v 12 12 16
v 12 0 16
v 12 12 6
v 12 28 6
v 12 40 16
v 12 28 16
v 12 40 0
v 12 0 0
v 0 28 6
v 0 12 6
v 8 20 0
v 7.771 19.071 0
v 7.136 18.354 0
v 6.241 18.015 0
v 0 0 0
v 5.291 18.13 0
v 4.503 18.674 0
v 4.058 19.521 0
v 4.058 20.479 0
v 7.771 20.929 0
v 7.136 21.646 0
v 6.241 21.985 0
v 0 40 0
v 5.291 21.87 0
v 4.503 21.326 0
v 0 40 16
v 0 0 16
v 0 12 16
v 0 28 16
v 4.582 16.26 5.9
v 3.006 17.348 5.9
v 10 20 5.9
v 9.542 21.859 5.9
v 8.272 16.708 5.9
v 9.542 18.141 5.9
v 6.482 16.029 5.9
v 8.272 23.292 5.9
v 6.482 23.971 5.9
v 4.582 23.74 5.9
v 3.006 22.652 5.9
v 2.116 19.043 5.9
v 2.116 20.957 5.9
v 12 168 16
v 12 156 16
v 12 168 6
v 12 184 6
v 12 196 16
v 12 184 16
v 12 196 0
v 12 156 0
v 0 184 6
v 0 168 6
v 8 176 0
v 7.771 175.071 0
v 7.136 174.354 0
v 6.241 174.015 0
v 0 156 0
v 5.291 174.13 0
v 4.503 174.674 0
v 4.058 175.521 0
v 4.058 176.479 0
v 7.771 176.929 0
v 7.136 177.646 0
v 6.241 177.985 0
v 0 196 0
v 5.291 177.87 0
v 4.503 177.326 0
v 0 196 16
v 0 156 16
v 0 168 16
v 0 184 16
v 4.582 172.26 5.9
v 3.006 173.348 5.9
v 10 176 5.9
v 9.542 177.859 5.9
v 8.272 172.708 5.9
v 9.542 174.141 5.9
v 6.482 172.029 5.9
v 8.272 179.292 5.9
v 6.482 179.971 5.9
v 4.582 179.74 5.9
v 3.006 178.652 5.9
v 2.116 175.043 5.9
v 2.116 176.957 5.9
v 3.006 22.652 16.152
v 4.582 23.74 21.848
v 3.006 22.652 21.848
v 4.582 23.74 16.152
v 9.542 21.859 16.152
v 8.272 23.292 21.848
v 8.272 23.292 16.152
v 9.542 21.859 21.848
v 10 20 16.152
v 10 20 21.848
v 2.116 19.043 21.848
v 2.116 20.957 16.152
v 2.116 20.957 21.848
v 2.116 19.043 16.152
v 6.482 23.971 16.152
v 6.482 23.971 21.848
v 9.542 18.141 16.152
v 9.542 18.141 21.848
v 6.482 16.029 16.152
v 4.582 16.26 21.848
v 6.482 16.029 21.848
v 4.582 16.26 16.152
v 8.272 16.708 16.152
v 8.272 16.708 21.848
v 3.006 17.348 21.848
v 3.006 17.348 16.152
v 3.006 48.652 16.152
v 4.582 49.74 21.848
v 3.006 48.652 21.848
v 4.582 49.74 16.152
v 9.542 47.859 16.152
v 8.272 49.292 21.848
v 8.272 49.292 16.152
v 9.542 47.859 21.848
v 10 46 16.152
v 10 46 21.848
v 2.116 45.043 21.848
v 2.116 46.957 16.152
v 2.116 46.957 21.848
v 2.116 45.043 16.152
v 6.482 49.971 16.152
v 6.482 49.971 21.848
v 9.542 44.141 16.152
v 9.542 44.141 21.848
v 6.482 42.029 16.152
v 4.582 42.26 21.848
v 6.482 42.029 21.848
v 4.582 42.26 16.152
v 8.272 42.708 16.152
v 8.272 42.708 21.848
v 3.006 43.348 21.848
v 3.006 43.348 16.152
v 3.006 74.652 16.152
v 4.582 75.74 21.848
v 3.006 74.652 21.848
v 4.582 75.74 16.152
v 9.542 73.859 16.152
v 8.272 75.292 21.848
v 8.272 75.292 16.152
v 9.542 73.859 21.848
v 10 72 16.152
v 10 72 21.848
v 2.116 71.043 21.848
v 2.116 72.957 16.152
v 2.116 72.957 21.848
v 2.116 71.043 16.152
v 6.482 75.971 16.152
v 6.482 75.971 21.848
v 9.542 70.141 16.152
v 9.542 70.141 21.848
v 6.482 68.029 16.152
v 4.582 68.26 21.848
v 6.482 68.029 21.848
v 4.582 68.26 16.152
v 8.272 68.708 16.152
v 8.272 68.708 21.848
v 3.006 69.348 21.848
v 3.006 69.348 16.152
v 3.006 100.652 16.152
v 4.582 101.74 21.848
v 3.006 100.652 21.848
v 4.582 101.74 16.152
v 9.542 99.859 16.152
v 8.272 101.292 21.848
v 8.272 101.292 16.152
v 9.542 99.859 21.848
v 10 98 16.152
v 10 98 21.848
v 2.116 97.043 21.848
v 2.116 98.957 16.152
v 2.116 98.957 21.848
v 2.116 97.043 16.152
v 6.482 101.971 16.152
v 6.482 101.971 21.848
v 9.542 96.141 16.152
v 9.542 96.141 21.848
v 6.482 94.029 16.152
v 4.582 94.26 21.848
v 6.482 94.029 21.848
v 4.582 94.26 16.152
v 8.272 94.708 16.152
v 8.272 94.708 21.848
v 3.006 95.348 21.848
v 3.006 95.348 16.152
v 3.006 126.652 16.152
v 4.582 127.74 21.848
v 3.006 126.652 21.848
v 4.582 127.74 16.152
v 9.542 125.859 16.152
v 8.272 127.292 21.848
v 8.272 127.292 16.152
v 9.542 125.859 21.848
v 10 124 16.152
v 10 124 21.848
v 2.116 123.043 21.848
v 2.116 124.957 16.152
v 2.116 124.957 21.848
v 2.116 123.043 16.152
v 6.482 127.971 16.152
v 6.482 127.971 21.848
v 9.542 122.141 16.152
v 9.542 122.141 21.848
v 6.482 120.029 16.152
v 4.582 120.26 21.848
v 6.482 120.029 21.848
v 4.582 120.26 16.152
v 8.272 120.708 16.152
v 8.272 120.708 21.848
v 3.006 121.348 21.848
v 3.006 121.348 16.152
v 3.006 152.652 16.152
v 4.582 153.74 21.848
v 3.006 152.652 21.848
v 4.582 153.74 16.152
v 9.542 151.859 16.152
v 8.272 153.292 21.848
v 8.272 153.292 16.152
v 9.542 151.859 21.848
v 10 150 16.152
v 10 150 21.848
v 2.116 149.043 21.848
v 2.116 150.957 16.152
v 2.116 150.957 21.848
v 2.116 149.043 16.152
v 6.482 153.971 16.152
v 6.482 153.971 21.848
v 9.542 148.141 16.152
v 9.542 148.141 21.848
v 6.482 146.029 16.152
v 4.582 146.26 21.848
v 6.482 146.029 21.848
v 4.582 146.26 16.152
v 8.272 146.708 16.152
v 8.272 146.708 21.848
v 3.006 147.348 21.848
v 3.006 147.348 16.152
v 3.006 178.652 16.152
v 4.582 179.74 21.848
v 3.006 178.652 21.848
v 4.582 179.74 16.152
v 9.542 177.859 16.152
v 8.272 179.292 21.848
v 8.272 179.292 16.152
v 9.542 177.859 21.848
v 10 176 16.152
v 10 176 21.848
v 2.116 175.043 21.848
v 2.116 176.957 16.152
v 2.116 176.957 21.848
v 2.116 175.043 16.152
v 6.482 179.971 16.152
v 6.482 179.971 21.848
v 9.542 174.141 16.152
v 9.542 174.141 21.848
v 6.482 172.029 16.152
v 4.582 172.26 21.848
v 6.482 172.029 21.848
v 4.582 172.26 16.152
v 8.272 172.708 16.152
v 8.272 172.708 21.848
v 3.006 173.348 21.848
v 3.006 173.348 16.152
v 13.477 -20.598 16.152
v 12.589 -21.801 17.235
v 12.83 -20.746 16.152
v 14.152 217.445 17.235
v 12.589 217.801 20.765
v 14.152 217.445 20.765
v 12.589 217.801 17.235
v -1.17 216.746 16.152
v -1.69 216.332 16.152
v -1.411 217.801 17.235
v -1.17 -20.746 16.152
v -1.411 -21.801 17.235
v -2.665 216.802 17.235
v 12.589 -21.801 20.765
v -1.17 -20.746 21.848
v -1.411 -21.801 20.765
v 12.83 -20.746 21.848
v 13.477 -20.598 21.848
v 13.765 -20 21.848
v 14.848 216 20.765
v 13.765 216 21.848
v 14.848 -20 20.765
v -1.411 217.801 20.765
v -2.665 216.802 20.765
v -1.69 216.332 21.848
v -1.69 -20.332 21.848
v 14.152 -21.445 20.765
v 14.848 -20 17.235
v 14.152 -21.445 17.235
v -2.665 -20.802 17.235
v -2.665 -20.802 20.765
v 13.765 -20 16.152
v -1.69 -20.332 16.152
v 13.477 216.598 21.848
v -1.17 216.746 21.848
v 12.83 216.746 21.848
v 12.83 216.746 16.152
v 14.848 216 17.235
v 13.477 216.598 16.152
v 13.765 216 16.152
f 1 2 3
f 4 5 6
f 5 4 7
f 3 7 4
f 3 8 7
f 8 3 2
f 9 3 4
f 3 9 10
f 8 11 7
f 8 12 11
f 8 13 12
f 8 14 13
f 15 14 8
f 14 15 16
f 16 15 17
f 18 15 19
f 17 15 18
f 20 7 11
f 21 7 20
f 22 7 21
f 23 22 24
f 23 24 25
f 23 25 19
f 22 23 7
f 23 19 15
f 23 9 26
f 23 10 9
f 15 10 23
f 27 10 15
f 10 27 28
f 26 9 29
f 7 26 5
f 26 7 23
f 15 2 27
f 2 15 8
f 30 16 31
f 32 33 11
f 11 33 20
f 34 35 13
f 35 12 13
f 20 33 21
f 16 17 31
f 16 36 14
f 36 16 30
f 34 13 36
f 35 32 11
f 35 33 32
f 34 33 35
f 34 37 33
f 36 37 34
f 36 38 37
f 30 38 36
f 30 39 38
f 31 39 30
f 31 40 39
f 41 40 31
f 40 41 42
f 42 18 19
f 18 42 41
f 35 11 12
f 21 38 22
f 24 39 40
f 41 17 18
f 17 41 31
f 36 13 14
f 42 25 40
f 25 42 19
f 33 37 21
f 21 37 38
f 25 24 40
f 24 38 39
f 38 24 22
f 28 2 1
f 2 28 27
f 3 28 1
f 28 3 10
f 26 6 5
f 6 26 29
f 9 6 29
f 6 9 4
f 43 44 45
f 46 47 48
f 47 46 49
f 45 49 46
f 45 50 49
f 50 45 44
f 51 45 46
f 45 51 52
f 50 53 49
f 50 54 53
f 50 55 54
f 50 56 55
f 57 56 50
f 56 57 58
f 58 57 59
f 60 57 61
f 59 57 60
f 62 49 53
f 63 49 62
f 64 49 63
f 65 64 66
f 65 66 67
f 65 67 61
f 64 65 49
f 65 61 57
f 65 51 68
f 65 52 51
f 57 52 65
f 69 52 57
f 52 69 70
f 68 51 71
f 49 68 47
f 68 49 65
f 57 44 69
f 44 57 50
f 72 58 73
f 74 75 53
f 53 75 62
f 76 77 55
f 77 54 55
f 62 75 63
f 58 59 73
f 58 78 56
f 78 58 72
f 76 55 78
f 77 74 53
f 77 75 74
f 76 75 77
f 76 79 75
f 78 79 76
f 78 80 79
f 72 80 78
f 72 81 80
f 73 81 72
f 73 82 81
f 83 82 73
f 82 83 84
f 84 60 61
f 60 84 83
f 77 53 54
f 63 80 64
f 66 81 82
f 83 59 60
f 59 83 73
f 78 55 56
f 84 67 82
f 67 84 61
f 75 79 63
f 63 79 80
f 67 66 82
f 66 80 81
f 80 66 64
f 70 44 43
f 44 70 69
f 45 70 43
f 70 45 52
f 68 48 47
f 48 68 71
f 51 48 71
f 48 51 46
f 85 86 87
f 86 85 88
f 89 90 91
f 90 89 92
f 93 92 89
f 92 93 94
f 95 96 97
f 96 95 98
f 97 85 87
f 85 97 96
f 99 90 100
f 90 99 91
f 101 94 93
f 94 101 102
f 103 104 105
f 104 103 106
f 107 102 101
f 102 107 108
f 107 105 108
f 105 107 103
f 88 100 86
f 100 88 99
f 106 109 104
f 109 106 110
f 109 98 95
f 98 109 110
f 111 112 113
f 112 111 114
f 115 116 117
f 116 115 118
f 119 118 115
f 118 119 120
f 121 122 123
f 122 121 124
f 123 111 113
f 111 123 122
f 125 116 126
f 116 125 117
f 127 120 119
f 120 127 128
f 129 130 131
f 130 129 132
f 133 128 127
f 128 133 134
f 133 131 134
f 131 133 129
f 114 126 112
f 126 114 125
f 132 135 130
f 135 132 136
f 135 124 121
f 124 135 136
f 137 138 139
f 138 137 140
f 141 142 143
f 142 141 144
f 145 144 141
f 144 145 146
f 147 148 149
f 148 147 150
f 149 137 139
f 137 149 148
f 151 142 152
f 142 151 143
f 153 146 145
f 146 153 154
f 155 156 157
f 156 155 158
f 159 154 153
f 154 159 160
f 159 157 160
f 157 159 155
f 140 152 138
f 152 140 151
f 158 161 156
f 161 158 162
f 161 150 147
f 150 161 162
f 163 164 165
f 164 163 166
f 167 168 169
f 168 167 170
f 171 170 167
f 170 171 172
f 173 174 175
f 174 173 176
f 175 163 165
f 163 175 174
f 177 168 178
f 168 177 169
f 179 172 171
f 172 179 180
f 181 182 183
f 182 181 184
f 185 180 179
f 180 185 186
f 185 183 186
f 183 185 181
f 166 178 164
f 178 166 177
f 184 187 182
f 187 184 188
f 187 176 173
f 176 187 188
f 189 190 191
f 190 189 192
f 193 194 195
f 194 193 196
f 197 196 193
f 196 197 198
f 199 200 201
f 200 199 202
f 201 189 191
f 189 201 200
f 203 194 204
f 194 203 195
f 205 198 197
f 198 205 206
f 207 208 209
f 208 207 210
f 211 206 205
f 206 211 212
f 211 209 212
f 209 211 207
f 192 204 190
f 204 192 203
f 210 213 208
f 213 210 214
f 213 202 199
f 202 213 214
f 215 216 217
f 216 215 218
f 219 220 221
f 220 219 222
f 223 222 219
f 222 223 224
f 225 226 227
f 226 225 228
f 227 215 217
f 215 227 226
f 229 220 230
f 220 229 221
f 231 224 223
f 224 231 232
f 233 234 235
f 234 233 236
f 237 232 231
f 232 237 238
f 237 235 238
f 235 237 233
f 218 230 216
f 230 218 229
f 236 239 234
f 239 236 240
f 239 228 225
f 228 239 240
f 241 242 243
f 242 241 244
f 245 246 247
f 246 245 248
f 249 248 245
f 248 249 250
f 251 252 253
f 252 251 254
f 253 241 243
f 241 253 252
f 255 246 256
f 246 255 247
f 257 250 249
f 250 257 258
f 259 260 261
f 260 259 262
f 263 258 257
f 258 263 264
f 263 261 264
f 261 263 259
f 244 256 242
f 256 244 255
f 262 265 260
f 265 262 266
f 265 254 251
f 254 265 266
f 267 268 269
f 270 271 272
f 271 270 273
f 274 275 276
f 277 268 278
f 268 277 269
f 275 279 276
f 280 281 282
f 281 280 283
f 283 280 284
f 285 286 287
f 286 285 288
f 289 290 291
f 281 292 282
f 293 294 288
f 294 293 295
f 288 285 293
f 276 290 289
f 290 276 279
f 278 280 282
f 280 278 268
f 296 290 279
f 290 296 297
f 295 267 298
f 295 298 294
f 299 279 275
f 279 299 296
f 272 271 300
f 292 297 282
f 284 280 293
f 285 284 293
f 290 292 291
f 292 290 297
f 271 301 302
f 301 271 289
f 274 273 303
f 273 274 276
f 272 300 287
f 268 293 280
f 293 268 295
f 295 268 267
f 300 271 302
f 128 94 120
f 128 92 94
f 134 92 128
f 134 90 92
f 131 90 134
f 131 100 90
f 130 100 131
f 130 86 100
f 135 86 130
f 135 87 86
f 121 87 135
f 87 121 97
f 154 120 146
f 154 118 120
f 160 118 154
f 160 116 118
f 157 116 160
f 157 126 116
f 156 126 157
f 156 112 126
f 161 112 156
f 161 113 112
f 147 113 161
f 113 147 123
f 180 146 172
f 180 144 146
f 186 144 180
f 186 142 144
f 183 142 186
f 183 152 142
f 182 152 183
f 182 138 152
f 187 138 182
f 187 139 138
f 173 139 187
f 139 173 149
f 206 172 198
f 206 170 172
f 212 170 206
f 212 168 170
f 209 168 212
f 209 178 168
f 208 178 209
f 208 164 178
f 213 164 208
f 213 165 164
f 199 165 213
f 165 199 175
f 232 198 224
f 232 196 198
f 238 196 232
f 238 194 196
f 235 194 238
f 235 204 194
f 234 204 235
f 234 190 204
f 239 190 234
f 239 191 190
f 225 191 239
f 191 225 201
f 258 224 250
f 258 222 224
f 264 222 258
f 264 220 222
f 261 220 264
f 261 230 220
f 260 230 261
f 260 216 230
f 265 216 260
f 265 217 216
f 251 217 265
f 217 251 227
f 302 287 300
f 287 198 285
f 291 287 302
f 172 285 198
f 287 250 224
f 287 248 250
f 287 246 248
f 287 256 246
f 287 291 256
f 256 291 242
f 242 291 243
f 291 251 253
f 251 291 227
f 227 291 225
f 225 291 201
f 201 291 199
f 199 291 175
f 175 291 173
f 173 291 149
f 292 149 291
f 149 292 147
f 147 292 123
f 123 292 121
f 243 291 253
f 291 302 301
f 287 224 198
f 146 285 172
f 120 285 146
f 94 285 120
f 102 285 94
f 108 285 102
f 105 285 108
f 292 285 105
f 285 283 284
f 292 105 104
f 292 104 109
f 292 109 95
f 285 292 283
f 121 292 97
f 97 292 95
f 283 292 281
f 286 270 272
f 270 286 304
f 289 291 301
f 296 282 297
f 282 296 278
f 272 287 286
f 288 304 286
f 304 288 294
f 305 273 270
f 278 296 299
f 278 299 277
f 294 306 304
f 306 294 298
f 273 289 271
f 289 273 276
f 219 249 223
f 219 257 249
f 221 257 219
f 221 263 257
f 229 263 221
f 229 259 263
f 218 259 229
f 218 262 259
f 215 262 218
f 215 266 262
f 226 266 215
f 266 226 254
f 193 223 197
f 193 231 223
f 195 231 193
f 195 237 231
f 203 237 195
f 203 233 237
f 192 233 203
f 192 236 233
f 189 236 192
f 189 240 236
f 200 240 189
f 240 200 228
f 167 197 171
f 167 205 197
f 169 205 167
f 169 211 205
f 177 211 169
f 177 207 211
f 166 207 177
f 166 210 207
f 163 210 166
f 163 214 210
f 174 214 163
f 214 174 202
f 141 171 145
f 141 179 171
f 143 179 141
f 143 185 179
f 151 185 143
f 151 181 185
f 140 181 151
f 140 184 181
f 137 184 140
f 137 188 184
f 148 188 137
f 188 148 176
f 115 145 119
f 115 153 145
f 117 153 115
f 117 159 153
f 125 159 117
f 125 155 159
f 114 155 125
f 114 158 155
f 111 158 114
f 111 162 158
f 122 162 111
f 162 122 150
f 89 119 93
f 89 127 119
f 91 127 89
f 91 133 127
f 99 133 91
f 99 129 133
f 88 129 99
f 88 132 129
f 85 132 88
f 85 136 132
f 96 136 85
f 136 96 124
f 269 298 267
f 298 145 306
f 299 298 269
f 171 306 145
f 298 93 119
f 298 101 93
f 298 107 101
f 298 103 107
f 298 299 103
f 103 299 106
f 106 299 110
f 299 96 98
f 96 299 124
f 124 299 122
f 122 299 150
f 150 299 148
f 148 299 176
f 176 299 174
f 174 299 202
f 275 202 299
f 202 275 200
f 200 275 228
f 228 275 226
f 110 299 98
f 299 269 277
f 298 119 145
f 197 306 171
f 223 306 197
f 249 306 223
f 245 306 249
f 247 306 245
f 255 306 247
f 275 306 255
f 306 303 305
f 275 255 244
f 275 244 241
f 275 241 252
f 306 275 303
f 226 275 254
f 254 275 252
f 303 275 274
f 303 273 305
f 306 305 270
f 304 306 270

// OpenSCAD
// Written by Jordi Riera-Babures <jrierab@gmail.com>
// ManetaNevera V2.0 - Parameterisized for Customizer
//
// To the extent possible under law, the author(s) have dedicated all
// copyright and related and neighboring rights to this software to the
// public domain worldwide. This software is distributed without any
// warranty.
//
// You should have received a copy of the CC0 Public Domain
// Dedication along with this software.
// If not, see <http://creativecommons.org/publicdomain/zero/1.0/>.

// Hole_Separation (mm)
Hole_Separation = 156;      // [50:300]
// Width of the refrigerator handle (mm)
Handle_Width = 18;          // [10:30]
// Height of the refrigerator handle (mm)
Handle_Height = 22;         // [10:40]
// Overhang (extension) on handle ends (mm)
Handle_Overhang = 20;       // [0:50]
// Height of the top/base horizontal bars (mm)
Bar_Height = 6;             // [3:10]
// Base bar width (mm)
Base_Width = 12;            // [5:20]
// Base Length to support the columns (mm)
Base_Length = 40;           // [14:60]
// Column_Length (mm)
Column_Length = 12;         // [4:20]
// Base screw radius (mm)
Base_Screw_Radius = 2;      // [1:10]
// Base screw head radius (mm)
Base_Screw_Head_Radius = 4; // [2:20]
// Number of holes in top
Num_Top_Holes = 7;          // [2:15]
// Top holes radius (mm)
Top_Hole_Radius = 4;        // [1:20]


// Build the handle
refrigerator_handle();


module refrigerator_handle() {
    // Smooth the handle
    Rounded_Corner_Radius = 2;

    // Correct the width position to account for the round corner
    HWC = -(Handle_Width - Base_Width) / 2;
    // Correct the length position to account for the round corners and overhang
    HLC = -(Rounded_Corner_Radius + Handle_Overhang);
    // Calculates the real handle length
    Handle_Length = Hole_Separation + Base_Length + 2*Handle_Overhang + 2*Rounded_Corner_Radius;
    // Calculates the top holes separation
    THS = Hole_Separation / (Num_Top_Holes - 1);

    // First base (screw hole + columns)
    base_hole();
    // Second base (screw hole + columns)
    translate([0, Hole_Separation, 0]) base_hole();

    // Top bar with holes
    difference() {
        // Top bar
        translate([HWC, HLC, Handle_Height - Bar_Height])
            roundedcube_simple([Handle_Width, Handle_Length, Bar_Height], false, Rounded_Corner_Radius);

        // Top holes
        translate([Base_Width/2, Base_Length/2, Handle_Height - Bar_Height])
            for (n =[0:Num_Top_Holes - 1])
                translate([0, n*THS, 0])
                    cylinder(h = Bar_Height, r1 = Top_Hole_Radius, r2 = Top_Hole_Radius);
    }
}


module base_hole() {
    Column_Height = Handle_Height - 2*Bar_Height;

    union() {
        // Base (with screw hole)
        difference() {
            cube([Base_Width, Base_Length, Bar_Height], false);
            translate([Base_Width/2, Base_Length/2, 0])
                // Reduces 0.1 mm to allow building without supports
                cylinder(h = Bar_Height-0.1, r1 = Base_Screw_Radius, r2 = Base_Screw_Head_Radius);
        }
        // Laterals - support columns
        translate([0, 0, Bar_Height])
            cube([Base_Width, Column_Length, Column_Height], false);
        translate([0, Base_Length - Column_Length, Bar_Height])
            cube([Base_Width, Column_Length, Column_Height], false);
    }
}


// https://gist.github.com/groovenectar/292db1688b79efd6ce11
module roundedcube_simple(size = [1, 1, 1], center = false, radius = 0.5) {
	// If single value, convert to [x, y, z] vector
	size = (size[0] == undef) ? [size, size, size] : size;

	translate = (center == false) ?
		[radius, radius, radius] :
		[
			radius - (size[0] / 2),
			radius - (size[1] / 2),
			radius - (size[2] / 2)
	];

	translate(v = translate)
	minkowski() {
		cube(size = [
			size[0] - (radius * 2),
			size[1] - (radius * 2),
			size[2] - (radius * 2)
		]);
		sphere(r = radius);
	}
}
